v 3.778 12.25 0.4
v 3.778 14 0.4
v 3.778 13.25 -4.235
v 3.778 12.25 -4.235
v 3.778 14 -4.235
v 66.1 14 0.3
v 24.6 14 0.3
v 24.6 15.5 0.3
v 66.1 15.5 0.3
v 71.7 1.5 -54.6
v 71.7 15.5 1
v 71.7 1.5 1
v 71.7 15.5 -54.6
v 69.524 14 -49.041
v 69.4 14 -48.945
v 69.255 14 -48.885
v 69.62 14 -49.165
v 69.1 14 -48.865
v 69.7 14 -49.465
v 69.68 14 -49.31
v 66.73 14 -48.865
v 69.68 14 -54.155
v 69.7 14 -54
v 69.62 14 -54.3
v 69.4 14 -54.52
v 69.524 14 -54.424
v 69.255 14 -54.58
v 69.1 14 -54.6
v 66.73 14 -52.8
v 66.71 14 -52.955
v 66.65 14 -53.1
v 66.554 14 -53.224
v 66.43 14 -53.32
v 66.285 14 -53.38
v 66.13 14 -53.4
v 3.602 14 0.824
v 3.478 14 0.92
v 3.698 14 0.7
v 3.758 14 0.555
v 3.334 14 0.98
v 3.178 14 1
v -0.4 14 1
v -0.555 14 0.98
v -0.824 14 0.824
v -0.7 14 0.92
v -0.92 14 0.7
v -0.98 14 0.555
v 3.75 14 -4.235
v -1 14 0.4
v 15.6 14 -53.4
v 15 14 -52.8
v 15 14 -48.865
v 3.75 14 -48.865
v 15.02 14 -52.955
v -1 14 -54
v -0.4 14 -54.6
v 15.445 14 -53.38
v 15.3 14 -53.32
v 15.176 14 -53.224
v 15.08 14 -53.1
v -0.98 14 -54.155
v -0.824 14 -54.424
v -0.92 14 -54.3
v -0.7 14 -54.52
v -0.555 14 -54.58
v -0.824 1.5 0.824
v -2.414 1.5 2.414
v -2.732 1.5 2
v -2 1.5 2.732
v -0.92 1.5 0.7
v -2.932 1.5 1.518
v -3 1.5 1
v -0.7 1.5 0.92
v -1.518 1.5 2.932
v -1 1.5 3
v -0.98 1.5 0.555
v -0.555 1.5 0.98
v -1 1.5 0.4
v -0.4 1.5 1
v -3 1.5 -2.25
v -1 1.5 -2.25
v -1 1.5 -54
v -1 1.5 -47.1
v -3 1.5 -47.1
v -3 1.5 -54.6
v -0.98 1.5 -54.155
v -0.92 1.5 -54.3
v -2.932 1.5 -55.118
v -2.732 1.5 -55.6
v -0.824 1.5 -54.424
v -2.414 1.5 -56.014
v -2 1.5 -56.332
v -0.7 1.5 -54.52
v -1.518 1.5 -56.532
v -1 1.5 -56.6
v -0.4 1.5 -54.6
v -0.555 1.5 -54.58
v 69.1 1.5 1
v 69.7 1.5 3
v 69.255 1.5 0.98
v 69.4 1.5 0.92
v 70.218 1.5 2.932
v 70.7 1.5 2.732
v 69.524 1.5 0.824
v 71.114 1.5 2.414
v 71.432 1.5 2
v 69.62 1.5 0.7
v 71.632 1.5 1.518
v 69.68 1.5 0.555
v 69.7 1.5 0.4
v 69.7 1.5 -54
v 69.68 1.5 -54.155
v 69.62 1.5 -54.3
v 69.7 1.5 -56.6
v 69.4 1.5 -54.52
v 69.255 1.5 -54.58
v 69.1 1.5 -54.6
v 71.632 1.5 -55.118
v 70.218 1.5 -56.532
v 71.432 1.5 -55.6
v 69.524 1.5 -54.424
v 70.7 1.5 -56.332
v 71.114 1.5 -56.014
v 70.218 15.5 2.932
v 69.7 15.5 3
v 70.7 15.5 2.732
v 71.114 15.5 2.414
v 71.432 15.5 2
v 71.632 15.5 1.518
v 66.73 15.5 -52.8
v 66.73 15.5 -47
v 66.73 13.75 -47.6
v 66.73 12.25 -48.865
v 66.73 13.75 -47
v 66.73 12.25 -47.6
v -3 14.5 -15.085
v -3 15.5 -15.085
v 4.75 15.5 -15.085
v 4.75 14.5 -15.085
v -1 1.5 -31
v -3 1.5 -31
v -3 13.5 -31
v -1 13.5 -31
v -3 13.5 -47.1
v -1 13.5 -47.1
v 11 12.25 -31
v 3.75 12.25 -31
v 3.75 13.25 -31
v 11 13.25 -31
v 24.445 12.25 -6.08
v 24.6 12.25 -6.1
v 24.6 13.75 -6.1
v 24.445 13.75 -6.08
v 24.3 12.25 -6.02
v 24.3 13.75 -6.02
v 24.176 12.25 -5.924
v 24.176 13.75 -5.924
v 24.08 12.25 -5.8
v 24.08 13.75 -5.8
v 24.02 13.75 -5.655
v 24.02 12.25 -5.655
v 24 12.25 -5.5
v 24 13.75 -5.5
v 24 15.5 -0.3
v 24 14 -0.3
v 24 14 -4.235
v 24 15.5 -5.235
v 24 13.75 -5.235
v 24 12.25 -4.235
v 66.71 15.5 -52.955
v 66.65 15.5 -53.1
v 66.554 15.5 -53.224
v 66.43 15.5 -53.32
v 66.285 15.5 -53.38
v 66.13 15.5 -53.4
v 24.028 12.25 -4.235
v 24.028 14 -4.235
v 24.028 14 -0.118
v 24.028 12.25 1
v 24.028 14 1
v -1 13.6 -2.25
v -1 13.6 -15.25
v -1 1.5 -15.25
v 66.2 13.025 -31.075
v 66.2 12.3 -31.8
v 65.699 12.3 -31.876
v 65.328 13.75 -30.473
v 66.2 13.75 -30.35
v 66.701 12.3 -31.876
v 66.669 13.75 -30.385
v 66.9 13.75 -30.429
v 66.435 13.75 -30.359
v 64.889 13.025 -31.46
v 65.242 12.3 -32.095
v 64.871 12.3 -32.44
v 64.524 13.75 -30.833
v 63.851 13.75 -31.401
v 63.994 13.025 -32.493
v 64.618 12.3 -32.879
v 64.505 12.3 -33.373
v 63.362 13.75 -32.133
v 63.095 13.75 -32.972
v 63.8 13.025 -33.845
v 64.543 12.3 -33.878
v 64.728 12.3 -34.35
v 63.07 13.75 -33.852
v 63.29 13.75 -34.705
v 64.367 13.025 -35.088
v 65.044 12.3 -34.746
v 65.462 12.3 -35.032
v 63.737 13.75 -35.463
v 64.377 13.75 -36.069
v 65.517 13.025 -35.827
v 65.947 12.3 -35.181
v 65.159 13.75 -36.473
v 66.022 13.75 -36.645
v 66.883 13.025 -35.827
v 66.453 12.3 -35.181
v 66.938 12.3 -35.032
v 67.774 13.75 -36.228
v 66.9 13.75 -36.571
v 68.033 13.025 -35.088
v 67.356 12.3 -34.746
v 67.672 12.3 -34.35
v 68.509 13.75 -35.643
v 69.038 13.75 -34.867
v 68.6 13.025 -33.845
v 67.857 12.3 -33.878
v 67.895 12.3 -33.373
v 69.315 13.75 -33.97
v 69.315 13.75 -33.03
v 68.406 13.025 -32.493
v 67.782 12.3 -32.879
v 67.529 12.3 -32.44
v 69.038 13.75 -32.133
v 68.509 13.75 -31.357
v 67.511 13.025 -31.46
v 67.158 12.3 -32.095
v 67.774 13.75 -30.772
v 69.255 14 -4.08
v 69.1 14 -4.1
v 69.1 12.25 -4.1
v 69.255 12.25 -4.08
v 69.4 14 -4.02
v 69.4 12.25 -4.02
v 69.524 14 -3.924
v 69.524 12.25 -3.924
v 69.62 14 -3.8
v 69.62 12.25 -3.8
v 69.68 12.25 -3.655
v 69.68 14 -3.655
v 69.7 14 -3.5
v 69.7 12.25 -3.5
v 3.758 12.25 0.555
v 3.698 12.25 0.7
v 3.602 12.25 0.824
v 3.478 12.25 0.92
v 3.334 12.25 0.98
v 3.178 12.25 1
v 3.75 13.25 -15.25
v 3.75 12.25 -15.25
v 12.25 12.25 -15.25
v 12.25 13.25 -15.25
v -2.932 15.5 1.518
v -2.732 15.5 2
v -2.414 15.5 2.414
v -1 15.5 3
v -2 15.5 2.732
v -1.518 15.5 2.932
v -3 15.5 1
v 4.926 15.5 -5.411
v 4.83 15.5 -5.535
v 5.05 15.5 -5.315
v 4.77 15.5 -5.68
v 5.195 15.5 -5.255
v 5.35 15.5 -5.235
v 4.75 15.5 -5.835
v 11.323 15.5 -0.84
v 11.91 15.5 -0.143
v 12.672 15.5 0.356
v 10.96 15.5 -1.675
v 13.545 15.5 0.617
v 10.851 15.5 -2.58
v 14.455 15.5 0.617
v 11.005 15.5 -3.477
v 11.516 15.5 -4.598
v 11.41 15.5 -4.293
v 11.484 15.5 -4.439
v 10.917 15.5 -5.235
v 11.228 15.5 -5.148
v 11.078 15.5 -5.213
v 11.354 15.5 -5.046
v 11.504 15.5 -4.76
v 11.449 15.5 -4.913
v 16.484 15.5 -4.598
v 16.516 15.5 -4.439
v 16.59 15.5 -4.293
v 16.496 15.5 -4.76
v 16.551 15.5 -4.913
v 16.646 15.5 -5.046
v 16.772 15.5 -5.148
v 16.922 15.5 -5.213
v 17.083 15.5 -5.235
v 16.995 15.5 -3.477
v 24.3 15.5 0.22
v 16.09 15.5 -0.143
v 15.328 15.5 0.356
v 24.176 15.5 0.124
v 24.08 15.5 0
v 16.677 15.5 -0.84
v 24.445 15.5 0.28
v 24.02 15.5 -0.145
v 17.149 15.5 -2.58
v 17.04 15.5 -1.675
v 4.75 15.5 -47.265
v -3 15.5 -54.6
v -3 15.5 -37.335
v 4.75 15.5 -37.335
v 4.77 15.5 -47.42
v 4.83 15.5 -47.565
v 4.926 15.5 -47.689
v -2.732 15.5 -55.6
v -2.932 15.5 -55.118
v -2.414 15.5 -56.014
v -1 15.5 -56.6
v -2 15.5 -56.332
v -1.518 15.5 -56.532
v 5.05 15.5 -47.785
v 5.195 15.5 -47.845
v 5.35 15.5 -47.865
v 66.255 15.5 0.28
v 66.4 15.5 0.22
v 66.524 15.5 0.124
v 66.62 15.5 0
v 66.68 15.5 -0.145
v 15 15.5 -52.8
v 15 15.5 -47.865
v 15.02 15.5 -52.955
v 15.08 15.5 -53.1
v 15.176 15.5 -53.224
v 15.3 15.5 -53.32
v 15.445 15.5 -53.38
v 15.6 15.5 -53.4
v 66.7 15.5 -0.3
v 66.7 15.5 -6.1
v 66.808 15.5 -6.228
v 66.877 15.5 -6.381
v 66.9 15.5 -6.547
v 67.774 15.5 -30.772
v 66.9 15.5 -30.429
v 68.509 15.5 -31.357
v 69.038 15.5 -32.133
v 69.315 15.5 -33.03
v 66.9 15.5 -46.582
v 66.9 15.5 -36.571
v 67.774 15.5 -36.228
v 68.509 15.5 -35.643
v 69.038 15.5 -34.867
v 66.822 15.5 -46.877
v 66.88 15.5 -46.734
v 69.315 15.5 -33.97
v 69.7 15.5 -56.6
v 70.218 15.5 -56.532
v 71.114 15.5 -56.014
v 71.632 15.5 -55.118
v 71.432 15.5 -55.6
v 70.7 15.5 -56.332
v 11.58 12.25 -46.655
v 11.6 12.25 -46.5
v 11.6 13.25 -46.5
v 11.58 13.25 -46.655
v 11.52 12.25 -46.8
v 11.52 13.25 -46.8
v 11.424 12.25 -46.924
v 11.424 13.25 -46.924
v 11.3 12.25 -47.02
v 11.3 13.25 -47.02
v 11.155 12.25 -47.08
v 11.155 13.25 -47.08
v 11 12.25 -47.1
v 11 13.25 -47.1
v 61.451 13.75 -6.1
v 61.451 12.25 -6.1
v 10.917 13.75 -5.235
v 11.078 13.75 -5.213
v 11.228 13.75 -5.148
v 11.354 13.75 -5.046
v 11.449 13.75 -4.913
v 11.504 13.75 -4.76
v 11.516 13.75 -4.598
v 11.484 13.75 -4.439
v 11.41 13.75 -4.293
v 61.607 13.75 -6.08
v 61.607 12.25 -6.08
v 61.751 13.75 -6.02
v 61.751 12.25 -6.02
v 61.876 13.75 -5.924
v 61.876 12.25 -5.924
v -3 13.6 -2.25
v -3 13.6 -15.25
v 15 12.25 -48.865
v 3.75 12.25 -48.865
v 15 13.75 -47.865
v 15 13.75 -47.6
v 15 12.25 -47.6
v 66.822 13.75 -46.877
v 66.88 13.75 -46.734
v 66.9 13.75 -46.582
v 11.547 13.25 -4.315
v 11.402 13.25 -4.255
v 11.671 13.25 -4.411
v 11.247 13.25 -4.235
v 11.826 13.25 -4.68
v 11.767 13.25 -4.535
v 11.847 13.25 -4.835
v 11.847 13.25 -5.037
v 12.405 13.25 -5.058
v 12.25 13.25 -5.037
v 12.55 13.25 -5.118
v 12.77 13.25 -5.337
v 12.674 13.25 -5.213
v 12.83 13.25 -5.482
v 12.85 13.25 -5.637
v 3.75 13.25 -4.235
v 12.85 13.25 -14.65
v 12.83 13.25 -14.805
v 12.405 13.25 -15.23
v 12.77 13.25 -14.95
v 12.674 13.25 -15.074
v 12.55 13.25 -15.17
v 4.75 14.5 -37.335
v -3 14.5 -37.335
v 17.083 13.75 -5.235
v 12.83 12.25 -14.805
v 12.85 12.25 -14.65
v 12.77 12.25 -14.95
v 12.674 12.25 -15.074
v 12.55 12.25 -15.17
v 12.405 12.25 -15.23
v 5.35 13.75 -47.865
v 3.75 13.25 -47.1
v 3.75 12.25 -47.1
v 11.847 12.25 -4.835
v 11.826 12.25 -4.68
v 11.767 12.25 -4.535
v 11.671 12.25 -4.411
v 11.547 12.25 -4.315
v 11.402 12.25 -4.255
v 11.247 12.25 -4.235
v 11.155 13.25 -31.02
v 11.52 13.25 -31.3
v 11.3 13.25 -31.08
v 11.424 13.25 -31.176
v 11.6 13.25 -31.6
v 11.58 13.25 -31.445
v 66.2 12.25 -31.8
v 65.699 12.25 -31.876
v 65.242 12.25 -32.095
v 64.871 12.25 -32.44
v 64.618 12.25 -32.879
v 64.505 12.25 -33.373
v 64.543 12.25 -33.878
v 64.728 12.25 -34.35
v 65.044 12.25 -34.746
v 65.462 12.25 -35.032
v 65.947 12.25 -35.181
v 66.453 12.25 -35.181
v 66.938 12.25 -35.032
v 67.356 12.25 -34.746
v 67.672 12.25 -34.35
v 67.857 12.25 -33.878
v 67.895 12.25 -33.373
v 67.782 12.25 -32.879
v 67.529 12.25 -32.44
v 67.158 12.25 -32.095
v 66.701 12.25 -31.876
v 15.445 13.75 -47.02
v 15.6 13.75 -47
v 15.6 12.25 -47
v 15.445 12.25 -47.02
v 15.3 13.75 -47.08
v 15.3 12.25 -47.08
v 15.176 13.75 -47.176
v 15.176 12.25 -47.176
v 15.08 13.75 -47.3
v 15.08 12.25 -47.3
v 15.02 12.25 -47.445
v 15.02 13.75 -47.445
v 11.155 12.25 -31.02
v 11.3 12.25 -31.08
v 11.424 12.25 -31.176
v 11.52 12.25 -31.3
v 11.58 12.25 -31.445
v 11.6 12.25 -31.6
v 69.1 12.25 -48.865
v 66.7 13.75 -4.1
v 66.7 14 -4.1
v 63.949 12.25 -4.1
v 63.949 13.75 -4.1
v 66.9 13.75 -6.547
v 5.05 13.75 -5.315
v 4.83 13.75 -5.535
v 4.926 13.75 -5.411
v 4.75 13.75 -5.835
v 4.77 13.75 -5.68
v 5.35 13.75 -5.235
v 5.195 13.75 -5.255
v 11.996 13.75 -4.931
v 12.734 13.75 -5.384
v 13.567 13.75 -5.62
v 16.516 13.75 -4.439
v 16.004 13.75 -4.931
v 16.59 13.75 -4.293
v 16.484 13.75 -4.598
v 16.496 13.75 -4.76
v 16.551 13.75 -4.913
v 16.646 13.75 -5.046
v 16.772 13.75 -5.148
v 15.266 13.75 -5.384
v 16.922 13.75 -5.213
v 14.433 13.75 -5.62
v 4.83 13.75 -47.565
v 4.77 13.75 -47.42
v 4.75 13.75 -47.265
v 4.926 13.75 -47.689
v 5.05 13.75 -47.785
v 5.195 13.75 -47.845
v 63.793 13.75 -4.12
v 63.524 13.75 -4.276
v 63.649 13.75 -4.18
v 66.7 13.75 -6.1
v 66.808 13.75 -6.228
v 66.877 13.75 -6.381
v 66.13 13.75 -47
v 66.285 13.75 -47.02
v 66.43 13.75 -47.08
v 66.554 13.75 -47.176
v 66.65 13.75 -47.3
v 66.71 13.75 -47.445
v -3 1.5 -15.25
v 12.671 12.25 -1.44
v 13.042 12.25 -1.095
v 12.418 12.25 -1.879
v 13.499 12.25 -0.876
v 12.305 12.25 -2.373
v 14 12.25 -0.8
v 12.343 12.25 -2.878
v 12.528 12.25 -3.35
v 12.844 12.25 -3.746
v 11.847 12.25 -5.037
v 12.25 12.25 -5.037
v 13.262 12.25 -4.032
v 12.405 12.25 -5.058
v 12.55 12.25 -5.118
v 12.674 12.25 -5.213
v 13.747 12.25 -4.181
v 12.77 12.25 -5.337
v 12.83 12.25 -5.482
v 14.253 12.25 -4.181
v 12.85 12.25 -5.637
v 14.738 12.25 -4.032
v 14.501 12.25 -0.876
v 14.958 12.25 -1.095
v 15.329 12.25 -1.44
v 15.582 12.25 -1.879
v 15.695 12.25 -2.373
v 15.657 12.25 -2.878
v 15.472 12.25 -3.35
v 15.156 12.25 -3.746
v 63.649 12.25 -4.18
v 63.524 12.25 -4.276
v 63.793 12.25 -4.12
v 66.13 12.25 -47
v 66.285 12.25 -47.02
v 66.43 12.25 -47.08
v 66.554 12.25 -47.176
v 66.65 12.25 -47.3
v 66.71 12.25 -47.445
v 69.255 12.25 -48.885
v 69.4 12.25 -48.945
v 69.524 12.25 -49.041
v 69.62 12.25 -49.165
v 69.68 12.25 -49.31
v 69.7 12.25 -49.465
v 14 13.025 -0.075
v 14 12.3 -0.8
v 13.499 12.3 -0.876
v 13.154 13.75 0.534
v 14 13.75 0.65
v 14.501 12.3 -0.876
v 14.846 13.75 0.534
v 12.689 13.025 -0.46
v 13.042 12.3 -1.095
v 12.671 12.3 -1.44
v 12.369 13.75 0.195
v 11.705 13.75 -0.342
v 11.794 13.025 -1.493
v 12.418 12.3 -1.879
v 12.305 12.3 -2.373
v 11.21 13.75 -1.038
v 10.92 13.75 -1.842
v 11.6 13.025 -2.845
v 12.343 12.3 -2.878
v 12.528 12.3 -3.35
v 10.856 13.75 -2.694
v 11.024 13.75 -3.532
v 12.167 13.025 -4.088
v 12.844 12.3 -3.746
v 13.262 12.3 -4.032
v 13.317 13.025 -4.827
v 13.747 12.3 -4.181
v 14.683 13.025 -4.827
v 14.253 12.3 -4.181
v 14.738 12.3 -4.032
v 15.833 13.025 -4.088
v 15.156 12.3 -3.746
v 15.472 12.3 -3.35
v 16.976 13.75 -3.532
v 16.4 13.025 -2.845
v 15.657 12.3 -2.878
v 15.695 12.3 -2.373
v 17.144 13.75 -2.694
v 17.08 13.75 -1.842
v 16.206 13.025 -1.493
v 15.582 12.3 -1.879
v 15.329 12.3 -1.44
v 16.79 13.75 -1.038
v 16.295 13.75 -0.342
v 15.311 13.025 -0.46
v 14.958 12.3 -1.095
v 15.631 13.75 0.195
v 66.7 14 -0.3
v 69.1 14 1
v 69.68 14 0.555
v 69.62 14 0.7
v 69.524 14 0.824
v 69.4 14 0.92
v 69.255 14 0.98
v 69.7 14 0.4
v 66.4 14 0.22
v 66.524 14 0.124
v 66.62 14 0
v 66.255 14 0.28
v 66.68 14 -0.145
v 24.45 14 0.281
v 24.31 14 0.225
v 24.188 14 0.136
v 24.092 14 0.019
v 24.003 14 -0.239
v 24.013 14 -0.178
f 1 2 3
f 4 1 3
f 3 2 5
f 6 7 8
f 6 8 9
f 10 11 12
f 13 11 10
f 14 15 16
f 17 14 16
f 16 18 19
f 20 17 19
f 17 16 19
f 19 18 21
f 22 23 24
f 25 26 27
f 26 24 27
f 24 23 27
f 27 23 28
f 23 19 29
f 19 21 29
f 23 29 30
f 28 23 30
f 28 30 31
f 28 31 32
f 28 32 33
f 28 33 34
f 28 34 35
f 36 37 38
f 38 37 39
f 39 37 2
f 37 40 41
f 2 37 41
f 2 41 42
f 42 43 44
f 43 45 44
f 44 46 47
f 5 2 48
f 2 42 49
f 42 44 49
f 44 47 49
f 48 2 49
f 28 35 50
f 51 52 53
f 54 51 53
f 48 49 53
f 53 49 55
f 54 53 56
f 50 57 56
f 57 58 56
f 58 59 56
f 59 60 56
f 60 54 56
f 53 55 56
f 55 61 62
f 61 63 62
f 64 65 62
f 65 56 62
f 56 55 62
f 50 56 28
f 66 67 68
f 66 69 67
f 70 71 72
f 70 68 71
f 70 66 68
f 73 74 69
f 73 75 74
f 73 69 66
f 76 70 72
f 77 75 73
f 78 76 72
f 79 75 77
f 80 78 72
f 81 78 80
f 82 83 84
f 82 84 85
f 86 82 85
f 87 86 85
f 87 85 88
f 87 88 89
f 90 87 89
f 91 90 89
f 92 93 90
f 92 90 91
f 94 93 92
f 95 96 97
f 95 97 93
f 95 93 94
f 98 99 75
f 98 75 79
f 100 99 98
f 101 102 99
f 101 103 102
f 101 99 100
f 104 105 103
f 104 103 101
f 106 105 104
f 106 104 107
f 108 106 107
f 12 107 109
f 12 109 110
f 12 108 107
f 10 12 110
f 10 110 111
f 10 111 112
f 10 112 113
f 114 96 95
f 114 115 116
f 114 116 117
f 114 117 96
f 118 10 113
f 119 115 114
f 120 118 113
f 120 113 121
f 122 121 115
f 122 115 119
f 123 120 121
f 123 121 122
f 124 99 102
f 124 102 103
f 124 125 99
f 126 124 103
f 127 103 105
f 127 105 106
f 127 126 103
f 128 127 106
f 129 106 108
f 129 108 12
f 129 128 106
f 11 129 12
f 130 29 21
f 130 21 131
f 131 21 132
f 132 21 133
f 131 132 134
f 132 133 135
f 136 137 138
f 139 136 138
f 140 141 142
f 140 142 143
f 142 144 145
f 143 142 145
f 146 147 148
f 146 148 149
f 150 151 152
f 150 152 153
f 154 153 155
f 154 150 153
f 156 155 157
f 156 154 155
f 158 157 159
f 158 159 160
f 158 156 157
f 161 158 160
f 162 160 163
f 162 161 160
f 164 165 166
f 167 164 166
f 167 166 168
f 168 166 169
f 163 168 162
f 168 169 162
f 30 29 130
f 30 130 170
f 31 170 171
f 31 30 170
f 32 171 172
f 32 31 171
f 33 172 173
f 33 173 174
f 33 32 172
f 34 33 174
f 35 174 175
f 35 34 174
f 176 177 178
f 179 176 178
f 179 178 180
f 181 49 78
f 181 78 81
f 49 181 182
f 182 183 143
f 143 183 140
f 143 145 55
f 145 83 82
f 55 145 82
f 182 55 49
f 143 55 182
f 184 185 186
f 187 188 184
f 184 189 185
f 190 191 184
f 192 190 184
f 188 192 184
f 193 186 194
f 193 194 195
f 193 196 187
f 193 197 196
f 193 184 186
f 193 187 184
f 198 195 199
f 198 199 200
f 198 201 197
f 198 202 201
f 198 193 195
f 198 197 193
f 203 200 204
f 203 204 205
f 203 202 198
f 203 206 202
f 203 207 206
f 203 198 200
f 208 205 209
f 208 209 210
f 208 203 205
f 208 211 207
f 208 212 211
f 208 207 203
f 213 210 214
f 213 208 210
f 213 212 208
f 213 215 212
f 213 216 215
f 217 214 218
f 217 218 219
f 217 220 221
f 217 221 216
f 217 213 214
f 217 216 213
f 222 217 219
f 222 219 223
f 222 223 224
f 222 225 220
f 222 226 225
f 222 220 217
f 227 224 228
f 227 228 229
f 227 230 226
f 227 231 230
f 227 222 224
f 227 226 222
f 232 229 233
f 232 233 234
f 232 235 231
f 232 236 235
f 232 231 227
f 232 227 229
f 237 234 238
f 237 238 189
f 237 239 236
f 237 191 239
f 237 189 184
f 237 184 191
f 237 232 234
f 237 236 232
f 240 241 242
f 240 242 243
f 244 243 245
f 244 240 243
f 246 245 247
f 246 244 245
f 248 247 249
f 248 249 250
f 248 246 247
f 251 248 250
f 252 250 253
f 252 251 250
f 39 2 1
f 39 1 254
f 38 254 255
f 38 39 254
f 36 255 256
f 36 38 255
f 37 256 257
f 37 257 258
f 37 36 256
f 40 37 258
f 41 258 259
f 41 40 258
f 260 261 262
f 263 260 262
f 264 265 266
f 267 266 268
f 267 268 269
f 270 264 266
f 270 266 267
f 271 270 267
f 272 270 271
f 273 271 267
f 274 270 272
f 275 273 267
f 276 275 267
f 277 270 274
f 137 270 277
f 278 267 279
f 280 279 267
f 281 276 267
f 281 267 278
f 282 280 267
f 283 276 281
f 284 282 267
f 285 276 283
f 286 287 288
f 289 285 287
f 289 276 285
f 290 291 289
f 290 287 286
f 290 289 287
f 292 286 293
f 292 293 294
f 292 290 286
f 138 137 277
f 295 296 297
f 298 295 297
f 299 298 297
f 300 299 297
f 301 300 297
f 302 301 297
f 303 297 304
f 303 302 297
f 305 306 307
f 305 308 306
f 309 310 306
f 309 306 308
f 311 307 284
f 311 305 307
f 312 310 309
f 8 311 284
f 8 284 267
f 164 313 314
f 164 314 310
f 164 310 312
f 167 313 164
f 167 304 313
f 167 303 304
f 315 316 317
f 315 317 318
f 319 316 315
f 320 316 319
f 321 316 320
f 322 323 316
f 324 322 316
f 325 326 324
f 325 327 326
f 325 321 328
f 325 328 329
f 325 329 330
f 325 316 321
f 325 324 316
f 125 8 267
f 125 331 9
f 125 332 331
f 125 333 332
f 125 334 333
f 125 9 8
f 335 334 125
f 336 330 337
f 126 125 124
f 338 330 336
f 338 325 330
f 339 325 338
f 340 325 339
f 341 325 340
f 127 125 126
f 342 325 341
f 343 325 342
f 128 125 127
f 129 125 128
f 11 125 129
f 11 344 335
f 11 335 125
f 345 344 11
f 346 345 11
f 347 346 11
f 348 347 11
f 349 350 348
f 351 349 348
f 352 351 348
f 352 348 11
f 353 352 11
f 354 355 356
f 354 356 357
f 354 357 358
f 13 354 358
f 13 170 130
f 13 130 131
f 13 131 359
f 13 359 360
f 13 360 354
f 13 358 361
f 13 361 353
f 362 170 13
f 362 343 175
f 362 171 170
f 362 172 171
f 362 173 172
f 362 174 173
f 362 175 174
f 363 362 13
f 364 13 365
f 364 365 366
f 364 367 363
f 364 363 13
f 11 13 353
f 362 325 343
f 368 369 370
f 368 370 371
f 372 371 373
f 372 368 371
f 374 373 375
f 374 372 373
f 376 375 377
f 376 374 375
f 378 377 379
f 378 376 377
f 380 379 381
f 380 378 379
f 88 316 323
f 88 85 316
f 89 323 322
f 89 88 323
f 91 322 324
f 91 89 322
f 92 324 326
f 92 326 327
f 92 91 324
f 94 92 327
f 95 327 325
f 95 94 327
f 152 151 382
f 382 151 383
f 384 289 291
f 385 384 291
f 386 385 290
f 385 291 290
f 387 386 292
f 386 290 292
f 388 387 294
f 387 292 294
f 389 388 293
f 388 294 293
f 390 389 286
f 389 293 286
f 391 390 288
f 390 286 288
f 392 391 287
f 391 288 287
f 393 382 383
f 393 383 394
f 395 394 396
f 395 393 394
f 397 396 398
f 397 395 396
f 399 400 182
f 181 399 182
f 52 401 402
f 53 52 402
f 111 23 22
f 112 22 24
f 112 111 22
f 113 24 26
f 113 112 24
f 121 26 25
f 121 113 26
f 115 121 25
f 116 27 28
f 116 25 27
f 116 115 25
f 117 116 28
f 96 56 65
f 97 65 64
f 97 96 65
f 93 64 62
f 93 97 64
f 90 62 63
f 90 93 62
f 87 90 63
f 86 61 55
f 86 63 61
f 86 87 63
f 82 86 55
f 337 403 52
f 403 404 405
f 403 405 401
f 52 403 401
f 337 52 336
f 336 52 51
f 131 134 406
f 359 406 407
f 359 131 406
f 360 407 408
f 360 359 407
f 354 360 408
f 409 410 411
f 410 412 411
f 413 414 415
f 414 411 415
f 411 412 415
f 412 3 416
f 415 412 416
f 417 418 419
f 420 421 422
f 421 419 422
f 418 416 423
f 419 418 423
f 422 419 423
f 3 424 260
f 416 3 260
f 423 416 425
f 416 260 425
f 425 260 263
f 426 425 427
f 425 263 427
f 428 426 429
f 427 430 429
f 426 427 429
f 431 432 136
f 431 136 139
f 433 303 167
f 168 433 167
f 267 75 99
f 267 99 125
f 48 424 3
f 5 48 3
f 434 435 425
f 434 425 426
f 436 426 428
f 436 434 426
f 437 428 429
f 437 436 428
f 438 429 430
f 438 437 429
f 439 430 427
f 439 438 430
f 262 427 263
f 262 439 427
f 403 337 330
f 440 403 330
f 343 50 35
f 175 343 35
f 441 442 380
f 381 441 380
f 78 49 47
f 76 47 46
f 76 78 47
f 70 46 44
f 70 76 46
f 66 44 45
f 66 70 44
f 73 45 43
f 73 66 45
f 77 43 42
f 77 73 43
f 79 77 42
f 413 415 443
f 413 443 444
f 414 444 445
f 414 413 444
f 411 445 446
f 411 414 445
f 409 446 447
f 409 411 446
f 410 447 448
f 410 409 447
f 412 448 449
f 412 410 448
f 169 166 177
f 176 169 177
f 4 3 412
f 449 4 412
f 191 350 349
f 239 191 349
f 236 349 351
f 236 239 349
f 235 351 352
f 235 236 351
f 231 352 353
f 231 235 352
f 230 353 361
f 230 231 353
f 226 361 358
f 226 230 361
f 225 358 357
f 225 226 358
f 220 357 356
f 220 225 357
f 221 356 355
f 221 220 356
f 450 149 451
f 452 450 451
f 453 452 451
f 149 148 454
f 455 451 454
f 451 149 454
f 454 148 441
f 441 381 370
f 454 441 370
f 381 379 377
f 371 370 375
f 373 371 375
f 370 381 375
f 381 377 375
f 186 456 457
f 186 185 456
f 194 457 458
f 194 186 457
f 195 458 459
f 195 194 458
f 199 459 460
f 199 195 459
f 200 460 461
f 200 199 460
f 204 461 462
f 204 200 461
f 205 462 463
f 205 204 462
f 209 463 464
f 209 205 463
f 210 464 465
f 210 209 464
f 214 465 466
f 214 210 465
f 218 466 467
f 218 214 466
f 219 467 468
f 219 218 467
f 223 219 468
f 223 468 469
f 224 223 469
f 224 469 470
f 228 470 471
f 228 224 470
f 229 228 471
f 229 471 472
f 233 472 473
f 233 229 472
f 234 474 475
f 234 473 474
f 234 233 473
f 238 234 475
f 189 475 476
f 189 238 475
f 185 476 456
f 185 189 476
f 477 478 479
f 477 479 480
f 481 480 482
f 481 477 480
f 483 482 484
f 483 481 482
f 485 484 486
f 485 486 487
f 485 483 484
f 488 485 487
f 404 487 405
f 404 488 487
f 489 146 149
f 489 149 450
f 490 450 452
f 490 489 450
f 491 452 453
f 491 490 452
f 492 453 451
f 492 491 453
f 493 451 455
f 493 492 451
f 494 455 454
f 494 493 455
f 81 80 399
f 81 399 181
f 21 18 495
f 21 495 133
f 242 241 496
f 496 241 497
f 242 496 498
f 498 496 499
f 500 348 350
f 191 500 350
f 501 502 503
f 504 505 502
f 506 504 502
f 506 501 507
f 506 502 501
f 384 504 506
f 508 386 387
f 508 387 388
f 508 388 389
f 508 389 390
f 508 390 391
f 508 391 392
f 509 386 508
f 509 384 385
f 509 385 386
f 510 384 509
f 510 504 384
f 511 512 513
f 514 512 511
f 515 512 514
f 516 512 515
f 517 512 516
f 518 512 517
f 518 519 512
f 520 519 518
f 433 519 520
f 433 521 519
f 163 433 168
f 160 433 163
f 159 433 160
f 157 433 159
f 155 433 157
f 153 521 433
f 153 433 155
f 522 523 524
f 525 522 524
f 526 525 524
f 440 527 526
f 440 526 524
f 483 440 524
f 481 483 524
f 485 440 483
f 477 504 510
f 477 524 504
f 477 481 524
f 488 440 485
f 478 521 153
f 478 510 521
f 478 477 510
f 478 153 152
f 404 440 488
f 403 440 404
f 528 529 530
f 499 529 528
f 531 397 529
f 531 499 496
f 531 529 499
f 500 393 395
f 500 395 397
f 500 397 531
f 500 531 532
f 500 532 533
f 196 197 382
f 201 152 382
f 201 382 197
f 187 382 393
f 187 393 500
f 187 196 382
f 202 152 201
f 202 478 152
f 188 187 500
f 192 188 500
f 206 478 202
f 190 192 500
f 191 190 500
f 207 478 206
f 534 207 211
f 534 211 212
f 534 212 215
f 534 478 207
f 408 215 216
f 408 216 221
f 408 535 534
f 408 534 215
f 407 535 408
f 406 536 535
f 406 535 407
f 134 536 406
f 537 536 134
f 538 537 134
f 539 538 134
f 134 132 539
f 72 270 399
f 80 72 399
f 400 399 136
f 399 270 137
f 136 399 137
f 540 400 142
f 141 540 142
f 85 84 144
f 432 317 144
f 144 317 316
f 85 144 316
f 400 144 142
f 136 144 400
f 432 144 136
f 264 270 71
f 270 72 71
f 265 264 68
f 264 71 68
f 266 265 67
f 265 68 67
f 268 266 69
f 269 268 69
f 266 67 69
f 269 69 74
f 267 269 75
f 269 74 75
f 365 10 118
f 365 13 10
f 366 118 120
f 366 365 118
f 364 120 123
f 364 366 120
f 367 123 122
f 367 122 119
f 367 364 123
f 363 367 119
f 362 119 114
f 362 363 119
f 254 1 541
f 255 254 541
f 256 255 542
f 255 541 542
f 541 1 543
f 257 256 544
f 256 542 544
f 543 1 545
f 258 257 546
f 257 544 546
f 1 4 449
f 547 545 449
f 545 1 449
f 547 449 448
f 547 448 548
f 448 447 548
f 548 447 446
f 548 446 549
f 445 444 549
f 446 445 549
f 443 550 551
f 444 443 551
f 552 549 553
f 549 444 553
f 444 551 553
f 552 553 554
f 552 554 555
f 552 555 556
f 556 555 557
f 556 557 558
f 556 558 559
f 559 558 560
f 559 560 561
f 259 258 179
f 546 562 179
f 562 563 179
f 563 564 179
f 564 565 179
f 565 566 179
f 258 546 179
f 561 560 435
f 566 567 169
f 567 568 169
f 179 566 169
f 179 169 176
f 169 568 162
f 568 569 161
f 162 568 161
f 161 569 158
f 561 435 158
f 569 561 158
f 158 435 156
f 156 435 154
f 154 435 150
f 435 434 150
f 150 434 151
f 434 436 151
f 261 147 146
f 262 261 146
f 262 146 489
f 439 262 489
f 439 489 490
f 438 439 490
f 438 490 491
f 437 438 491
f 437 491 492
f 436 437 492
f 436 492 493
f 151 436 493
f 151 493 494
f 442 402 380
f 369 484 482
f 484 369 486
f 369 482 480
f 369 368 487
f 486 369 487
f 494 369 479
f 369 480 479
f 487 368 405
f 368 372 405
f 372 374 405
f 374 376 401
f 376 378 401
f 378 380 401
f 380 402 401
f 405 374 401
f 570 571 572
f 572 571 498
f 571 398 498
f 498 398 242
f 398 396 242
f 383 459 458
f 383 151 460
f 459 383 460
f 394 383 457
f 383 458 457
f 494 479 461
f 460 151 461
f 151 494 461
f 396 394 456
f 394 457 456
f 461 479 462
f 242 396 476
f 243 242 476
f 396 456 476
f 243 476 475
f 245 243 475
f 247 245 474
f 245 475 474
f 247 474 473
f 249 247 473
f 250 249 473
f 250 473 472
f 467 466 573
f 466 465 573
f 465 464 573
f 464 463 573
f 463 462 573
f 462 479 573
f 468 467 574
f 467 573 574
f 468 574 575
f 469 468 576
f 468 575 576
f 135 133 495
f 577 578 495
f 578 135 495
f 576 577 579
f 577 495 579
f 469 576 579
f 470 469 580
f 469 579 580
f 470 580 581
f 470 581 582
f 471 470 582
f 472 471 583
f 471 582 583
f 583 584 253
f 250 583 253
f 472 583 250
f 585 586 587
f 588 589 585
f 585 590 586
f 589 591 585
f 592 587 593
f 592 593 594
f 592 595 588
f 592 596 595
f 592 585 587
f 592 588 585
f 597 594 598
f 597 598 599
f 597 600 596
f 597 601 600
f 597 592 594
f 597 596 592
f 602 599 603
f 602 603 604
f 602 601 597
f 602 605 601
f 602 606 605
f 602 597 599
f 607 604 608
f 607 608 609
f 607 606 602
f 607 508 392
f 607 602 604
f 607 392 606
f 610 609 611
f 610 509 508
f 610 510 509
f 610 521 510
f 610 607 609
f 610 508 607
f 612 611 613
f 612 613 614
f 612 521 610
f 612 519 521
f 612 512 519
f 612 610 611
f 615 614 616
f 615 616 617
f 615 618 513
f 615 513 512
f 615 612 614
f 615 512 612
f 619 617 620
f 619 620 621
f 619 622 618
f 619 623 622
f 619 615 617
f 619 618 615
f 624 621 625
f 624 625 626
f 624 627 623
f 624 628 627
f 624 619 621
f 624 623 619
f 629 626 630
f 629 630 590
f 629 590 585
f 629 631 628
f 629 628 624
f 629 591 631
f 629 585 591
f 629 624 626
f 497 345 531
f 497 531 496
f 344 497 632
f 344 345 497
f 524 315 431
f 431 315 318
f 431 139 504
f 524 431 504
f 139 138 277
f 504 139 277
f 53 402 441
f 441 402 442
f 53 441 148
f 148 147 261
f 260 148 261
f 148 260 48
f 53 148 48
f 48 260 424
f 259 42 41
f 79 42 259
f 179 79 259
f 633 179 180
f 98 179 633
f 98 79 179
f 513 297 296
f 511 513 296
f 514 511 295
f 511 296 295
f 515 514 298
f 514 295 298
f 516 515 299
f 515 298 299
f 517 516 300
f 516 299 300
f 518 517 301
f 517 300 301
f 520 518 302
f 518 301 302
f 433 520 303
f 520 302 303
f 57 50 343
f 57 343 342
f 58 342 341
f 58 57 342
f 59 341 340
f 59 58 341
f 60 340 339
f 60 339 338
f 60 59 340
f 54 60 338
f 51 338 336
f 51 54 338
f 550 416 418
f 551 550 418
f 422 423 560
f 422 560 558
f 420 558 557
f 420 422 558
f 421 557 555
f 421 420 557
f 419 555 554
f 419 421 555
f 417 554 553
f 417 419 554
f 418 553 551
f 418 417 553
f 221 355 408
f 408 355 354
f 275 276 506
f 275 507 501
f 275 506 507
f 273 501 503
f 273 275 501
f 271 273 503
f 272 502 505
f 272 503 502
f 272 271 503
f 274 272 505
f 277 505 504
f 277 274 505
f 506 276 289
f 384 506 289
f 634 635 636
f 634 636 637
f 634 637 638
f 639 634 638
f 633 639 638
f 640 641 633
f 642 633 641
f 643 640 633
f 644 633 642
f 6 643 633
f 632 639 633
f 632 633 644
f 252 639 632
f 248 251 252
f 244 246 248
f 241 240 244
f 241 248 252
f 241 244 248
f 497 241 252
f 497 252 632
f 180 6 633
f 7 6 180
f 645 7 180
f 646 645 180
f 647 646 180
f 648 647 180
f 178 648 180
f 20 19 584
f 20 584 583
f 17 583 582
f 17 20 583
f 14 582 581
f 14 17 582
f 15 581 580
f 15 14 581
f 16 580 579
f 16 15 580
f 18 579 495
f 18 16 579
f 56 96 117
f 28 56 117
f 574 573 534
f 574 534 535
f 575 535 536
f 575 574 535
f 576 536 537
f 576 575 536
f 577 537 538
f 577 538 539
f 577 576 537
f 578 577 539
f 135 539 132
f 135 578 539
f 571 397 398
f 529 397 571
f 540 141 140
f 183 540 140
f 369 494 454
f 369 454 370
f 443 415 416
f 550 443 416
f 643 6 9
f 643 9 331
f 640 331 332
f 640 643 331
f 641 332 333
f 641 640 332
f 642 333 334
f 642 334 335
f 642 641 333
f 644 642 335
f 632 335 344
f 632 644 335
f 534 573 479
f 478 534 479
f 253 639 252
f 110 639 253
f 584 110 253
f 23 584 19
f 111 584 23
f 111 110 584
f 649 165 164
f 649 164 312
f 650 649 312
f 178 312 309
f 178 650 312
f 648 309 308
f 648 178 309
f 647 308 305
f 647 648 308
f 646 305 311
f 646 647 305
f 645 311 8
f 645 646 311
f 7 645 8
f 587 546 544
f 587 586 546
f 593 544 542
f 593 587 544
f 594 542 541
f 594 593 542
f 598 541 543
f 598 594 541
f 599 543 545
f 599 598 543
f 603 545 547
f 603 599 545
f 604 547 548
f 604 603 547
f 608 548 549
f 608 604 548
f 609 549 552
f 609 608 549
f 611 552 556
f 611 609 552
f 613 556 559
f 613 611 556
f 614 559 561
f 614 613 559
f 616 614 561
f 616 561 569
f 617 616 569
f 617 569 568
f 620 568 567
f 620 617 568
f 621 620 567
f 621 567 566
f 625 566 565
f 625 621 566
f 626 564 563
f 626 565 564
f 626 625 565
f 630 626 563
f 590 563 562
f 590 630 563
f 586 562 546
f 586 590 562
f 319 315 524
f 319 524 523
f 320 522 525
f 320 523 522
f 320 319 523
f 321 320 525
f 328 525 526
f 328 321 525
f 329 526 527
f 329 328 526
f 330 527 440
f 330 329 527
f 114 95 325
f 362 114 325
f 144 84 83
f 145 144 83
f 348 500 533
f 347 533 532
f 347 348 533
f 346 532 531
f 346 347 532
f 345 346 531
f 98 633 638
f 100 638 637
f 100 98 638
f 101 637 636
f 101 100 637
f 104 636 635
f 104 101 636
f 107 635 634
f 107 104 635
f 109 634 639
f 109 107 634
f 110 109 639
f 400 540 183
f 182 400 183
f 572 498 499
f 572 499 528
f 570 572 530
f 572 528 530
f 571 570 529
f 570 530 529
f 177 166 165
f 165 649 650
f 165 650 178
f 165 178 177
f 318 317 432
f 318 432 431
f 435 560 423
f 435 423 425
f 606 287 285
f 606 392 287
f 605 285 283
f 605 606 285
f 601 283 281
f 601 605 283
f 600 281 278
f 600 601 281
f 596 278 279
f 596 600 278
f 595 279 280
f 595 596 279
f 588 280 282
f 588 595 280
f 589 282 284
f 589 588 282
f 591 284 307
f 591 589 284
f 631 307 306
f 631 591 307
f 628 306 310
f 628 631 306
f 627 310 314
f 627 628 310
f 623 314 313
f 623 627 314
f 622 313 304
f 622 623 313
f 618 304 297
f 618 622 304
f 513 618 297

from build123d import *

# Parameters (mm, degrees)
WALLS_START                                    = 1.5
SKETCH2_W                                      = 74.7
SKETCH2_H                                      = 59.6
SKETCH2_W_2                                    = 70.7
SKETCH2_H_2                                    = 55.6
WALLS_DEPTH                                    = 12.5
BOSS_EXTRUDE2_START                            = -3
SKETCH3_W                                      = 59.6
SKETCH3_H                                      = 1.5
BOSS_EXTRUDE2_DEPTH                            = 74.7
SKETCH4_W                                      = 20.4
SKETCH4_H                                      = 16.1
CUT_EXTRUDE1_DEPTH                             = 12
SKETCH5_W                                      = 18.25
SKETCH5_H                                      = 13
CUT_EXTRUDE2_DEPTH                             = 12.1
SKETCH6_W                                      = 51.73
SKETCH6_H                                      = 6.4
SKETCH6_W_2                                    = 42.7
CUT_EXTRUDE3_DEPTH                             = 93.414555131
BOSS_EXTRUDE5_START                            = 2
BOSS_EXTRUDE5_DEPTH                            = 3.25
CUT_EXTRUDE6_DEPTH                             = 1.75
SKETCH16_W                                     = 12.95
SKETCH16_H                                     = 22.25
CUT_EXTRUDE7_DEPTH                             = 1
HOLE_PADDING_DEPTH                             = 1.5
ROOF_FILL_IN_DEPTH                             = 1.75
FILLET2_R                                      = 2
CUT_EXTRUDE9_START                             = 2
SKETCH18_W                                     = 20.4
SKETCH18_H                                     = 16.1
SKETCH18_W_2                                   = 18.25
SKETCH18_H_2                                   = 13
CUT_EXTRUDE9_DEPTH                             = 1
ROOF_FILL_IN_2_REACH                           = 94.199
CSK_FOR_M3_FLAT_HEAD_MACHINE_SCREW8_AT_2_COUNT = 2
CSK_FOR_M3_FLAT_HEAD_MACHINE_SCREW8_AT_2_PITCH = 60.711119245
HOLE_CLEARANCE_REACH                           = 94.166
SKETCH46_R                                     = 3.15
FILLET3_R                                      = 0.6


with BuildPart() as part:
    # Sketch2 → walls (new body)
    with BuildSketch(Plane(origin=(0, 0, 0), x_dir=(1, 0, 0), z_dir=(0, 1, 0)).offset(WALLS_START)):
        with Locations((34.35, 26.8)):
            Rectangle(SKETCH2_W, SKETCH2_H)
        with Locations((34.35, 26.8)):
            Rectangle(SKETCH2_W_2, SKETCH2_H_2, mode=Mode.SUBTRACT)
    extrude(amount=WALLS_DEPTH)

    # Sketch3 → Boss-Extrude2 (add)
    with BuildSketch(Plane(origin=(0, 0, 0), x_dir=(0, 0, -1), z_dir=(1, 0, 0)).offset(BOSS_EXTRUDE2_START)):
        with Locations((26.8, 14.75)):
            Rectangle(SKETCH3_W, SKETCH3_H)
    extrude(amount=BOSS_EXTRUDE2_DEPTH)

    # Sketch4 → Cut-Extrude1 (cut)
    with BuildSketch(Plane(origin=(0, 1.5, 0), x_dir=(1, 0, 0), z_dir=(0, 1, 0))):
        with Locations((1.4, 39.05)):
            Rectangle(SKETCH4_W, SKETCH4_H)
    extrude(amount=CUT_EXTRUDE1_DEPTH, mode=Mode.SUBTRACT)

    # Sketch5 → Cut-Extrude2 (cut)
    with BuildSketch(Plane(origin=(0, 1.5, 0), x_dir=(1, 0, 0), z_dir=(0, 1, 0))):
        with Locations((3.725, 8.75)):
            Rectangle(SKETCH5_W, SKETCH5_H)
    extrude(amount=CUT_EXTRUDE2_DEPTH, mode=Mode.SUBTRACT)

    # Sketch6 → Cut-Extrude3 (cut, through all)
    with BuildSketch(Plane(origin=(0, 1.5, 0), x_dir=(1, 0, 0), z_dir=(0, 1, 0))):
        with Locations((40.865, 50.2)):
            Rectangle(SKETCH6_W, SKETCH6_H)
        with Locations((45.35, 2.9)):
            Rectangle(SKETCH6_W_2, SKETCH6_H)
    extrude(amount=CUT_EXTRUDE3_DEPTH, mode=Mode.SUBTRACT)

    # Sketch13 → Boss-Extrude5 (add)
    with BuildSketch(Plane(origin=(0, 10.25, 0), x_dir=(1, 0, 0), z_dir=(0, 1, 0)).offset(BOSS_EXTRUDE5_START)):
        Polygon((3.75, 4.235), (24, 4.235), (24, 6.1), (66.7, 6.1), (66.7, 4.235), (67.9, 4.235), (67.9, 48.865), (66.73, 48.865), (66.73, 47), (15, 47), (15, 48.865), (3.75, 48.865), align=None)
    extrude(amount=BOSS_EXTRUDE5_DEPTH)

    # Sketch15 → Cut-Extrude6 (cut)
    with BuildSketch(Plane(origin=(0, 15.5, 0), x_dir=(1, 0, 0), z_dir=(0, 1, 0))):
        Polygon((4.75, 5.235), (24, 5.235), (24, 6.1), (66.9, 6.1), (66.9, 47), (15, 47), (15, 47.865), (4.75, 47.865), align=None)
    extrude(amount=-CUT_EXTRUDE6_DEPTH, mode=Mode.SUBTRACT)

    # Sketch16 → Cut-Extrude7 (cut)
    with BuildSketch(Plane(origin=(0, 15.5, 0), x_dir=(1, 0, 0), z_dir=(0, 1, 0))):
        with Locations((3.475, 26.21)):
            Rectangle(SKETCH16_W, SKETCH16_H)
    extrude(amount=-CUT_EXTRUDE7_DEPTH, mode=Mode.SUBTRACT)

    # Sketch45 → Hole padding (add)
    with BuildSketch(Plane(origin=(0, 13.75, 0), x_dir=(1, 0, 0), z_dir=(0, 1, 0))):
        Polygon((63.7, 4.1), (66.7, 4.1), (66.7, 6.1), (61.7, 6.1), align=None)
    extrude(amount=-HOLE_PADDING_DEPTH)

    # Sketch43 → Roof fill-in (add)
    with BuildSketch(Plane.XZ.offset(-14)):
        Polygon((67.9, -48.865), (67.9, -4.235), (66.7, -4.235), (66.7, -4.1), (67.9, -4.1), (69.7, -4.1), (69.7, -48.865), align=None)
    extrude(amount=ROOF_FILL_IN_DEPTH)

    # Fillet2
    fillet2_edges = [part.edges().sort_by_distance(p)[0] for p in [
        (71.7, 8.5, -56.6),
        (71.7, 8.5, 3),
        (-3, 8.5, 3),
        (-3, 8.5, -56.6),
    ]]
    fillet(fillet2_edges, radius=FILLET2_R)

    # Sketch18 → Cut-Extrude9 (cut)
    with BuildSketch(Plane(origin=(0, 10.25, 0), x_dir=(1, 0, 0), z_dir=(0, 1, 0)).offset(CUT_EXTRUDE9_START)):
        with Locations((1.4, 39.05)):
            Rectangle(SKETCH18_W, SKETCH18_H)
        with Locations((3.725, 8.75)):
            Rectangle(SKETCH18_W_2, SKETCH18_H_2)
    extrude(amount=CUT_EXTRUDE9_DEPTH, mode=Mode.SUBTRACT)

    # Roof fill in 2: up to this face of the body (flat: up to its plane)
    roof_fill_in_2_end = Plane(part.part.faces().sort_by_distance((38.949640059, 12.25, -26.379272671))[0])
    # Sketch47 → Roof fill in 2 (add, up to the picked face)
    with BuildSketch(Plane.XZ.offset(-14), mode=Mode.PRIVATE) as roof_fill_in_2_sk1:
        Polygon((3.778208992, -4.235), (11.846933601, -4.235), (11.846933601, -5.037467277), (12.85, -5.037467277), (12.85, -4.235), (24.028208992, -4.235), (24.028208992, 1), (3.778208992, 1), align=None)
    roof_fill_in_2_tool1 = split(extrude(roof_fill_in_2_sk1.sketch, amount=ROOF_FILL_IN_2_REACH, mode=Mode.PRIVATE), bisect_by=roof_fill_in_2_end, keep=Keep.BOTH, mode=Mode.PRIVATE)
    add(roof_fill_in_2_tool1.solids().sort_by(Axis((13.891493, 14, -1.640249), (0, -1, 0)))[0])

    # Sketch42 → CSK for M3 Flat Head Machine Screw8 (revolve, cut)
    with BuildSketch(Plane(origin=(66.2, 13.75, -33.5), x_dir=(0, 0, 1), z_dir=(1, 0, 0))):
        Polygon((0, 0), (0, 8.521463052), (1.7, 7.5), (1.7, 1.45), (3.15, 0), align=None)
    csk_for_m3_flat_head_machine_screw8 = revolve(axis=Axis((66.2, 20.1, -33.5), (0, -1, 0)), mode=Mode.SUBTRACT)

    # CSK for M3 Flat Head Machine Screw8 at 2: CSK for M3 Flat Head Machine Screw8 ×2
    with Locations(*[Vector(-0.8598095480534521, 0, 0.5106148657022418) * (i * CSK_FOR_M3_FLAT_HEAD_MACHINE_SCREW8_AT_2_PITCH) for i in range(1, CSK_FOR_M3_FLAT_HEAD_MACHINE_SCREW8_AT_2_COUNT)]):
        add(csk_for_m3_flat_head_machine_screw8, mode=Mode.SUBTRACT)

    # Sketch46 → Hole clearance (cut, up to next)
    with BuildSketch(Plane(origin=(0, 13.75, 0), x_dir=(1, 0, 0), z_dir=(0, 1, 0)), mode=Mode.PRIVATE) as hole_clearance_sk1:
        with Locations((66.2, 33.5)):
            Circle(SKETCH46_R)
    hole_clearance_tool1 = extrude(hole_clearance_sk1.sketch, amount=HOLE_CLEARANCE_REACH, mode=Mode.PRIVATE) & part.part
    # Sketch46 → Hole clearance (cut, up to next)
    with BuildSketch(Plane(origin=(0, 13.75, 0), x_dir=(1, 0, 0), z_dir=(0, 1, 0)), mode=Mode.PRIVATE) as hole_clearance_sk2:
        with Locations((14, 2.5)):
            Circle(SKETCH46_R)
    hole_clearance_tool2 = extrude(hole_clearance_sk2.sketch, amount=HOLE_CLEARANCE_REACH, mode=Mode.PRIVATE) & part.part
    add(hole_clearance_tool1.solids().sort_by_distance((66.2, 13.75, -33.5))[0], mode=Mode.SUBTRACT)
    add(hole_clearance_tool2.solids().sort_by_distance((14, 13.75, -2.5))[0], mode=Mode.SUBTRACT)

    # Fillet3
    # the kernel refuses this fillet: 0.6 mm, written as the material it adds along each edge
    with BuildSketch(Plane(origin=(69.7, 1.5, 1), x_dir=(-1, 0, 0), z_dir=(0, 1, 0)), Plane(origin=(-1, 1.5, 1), x_dir=(0, 0, -1), z_dir=(0, 1, 0))) as fillet3_piece_1:
        with BuildLine():
            CenterArc((FILLET3_R, -FILLET3_R), FILLET3_R, 90, 90)
            Line((0, -FILLET3_R), (0, 0))
            Line((0, 0), (FILLET3_R, 0))
        make_face()
    extrude(amount=14)
    with BuildSketch(Plane(origin=(-1, 1.5, -54.6), x_dir=(0, 0, 1), z_dir=(0, 1, 0)), Plane(origin=(69.7, 1.5, -54.6), x_dir=(-1, 0, 0), z_dir=(0, 1, 0))) as fillet3_piece_2:
        with BuildLine():
            CenterArc((FILLET3_R, FILLET3_R), FILLET3_R, 180, 90)
            Line((0, FILLET3_R), (0, 0))
            Line((0, 0), (FILLET3_R, 0))
        make_face()
    extrude(amount=14)
    with BuildSketch(Plane(origin=(12.85, 12.25, -15.25), x_dir=(0, 0, 1), z_dir=(0, 1, 0)), Plane(origin=(11.6, 12.25, -47.1), x_dir=(0, 0, 1), z_dir=(0, 1, 0)), Plane(origin=(11.6, 12.25, -31), x_dir=(-1, 0, 0), z_dir=(0, 1, 0))) as fillet3_piece_3:
        with BuildLine():
            CenterArc((FILLET3_R, -FILLET3_R), FILLET3_R, 90, 90)
            Line((0, -FILLET3_R), (0, 0))
            Line((0, 0), (FILLET3_R, 0))
        make_face()
    extrude(amount=1)
    with BuildSketch(Plane(origin=(66.9, 15.5, -6.1), x_dir=(0, 0, -1), z_dir=(0, -1, 0))) as fillet3_piece_4:
        with BuildLine():
            CenterArc((0.447213595, -0.6), FILLET3_R, 90, 48.189685102)
            Line((0, -0.2), (0, 0))
            Line((0, 0), (0.447213595, 0))
        make_face()
    extrude(amount=2.868033989)
    with BuildSketch(Plane(origin=(66.9, 15.5, -47), x_dir=(-1, 0, 0), z_dir=(0, -1, 0))) as fillet3_piece_5:
        with BuildLine():
            CenterArc((0.6, -0.418449519), FILLET3_R, 135.779955569, 44.220044431)
            Line((0, -0.418449519), (0, 0))
            Line((0, 0), (0.17, 0))
        make_face()
    extrude(amount=2.796123798)
    with BuildSketch(Plane(origin=(4.75, 15.5, -47.865), x_dir=(0, 0, 1), z_dir=(0, -1, 0)), Plane(origin=(69.7, 15.5, -48.865), x_dir=(0, 0, -1), z_dir=(0, -1, 0))) as fillet3_piece_6:
        with BuildLine():
            CenterArc((FILLET3_R, -FILLET3_R), FILLET3_R, 90, 90)
            Line((0, -FILLET3_R), (0, 0))
            Line((0, 0), (FILLET3_R, 0))
        make_face()
    extrude(amount=3.25)
    with BuildSketch(Plane(origin=(4.75, 15.5, -5.235), x_dir=(0, 0, -1), z_dir=(0, -1, 0))) as fillet3_piece_7_section:
        with BuildLine():
            CenterArc((FILLET3_R, FILLET3_R), FILLET3_R, 180, 90)
            Line((0, FILLET3_R), (0, 0))
            Line((0, 0), (FILLET3_R, 0))
        make_face()
    fillet3_piece_7 = extrude(amount=3.25, mode=Mode.PRIVATE)
    fillet3_piece_7 = split(fillet3_piece_7, bisect_by=Plane(origin=(4.75, 13.25, -5.235), z_dir=(0, 1, 0)), keep=Keep.TOP, mode=Mode.PRIVATE)
    add(fillet3_piece_7)
    with BuildSketch(Plane(origin=(24, 12.25, -6.1), x_dir=(0, 0, 1), z_dir=(0, 1, 0)), Plane(origin=(66.7, 14, 0.3), x_dir=(0, 0, -1), z_dir=(0, 1, 0)), Plane(origin=(24, 14, 0.3), x_dir=(1, 0, 0), z_dir=(0, 1, 0)), Plane(origin=(15, 14, -53.4), x_dir=(0, 0, 1), z_dir=(0, 1, 0)), Plane(origin=(66.73, 12.25, -47), x_dir=(0, 0, -1), z_dir=(0, 1, 0)), Plane(origin=(66.73, 14, -53.4), x_dir=(-1, 0, 0), z_dir=(0, 1, 0)), Plane(origin=(15, 13.75, -47), x_dir=(0, 0, -1), z_dir=(0, -1, 0))) as fillet3_piece_8:
        with BuildLine():
            CenterArc((FILLET3_R, FILLET3_R), FILLET3_R, 180, 90)
            Line((0, FILLET3_R), (0, 0))
            Line((0, 0), (FILLET3_R, 0))
        make_face()
    extrude(amount=1.5)
    with BuildSketch(Plane(origin=(11.846933601, 13.25, -4.235), x_dir=(-1, 0, 0), z_dir=(0, -1, 0)), Plane(origin=(12.85, 13.25, -5.037467277), x_dir=(-1, 0, 0), z_dir=(0, -1, 0))) as fillet3_piece_9:
        with BuildLine():
            CenterArc((FILLET3_R, FILLET3_R), FILLET3_R, 180, 90)
            Line((0, FILLET3_R), (0, 0))
            Line((0, 0), (FILLET3_R, 0))
        make_face()
    extrude(amount=1)
    with BuildSketch(Plane(origin=(61.7, 13.75, -6.1), x_dir=(-1, 0, 0), z_dir=(0, -1, 0))) as fillet3_piece_10:
        with BuildLine():
            CenterArc((FILLET3_R * 0.414213562373, -FILLET3_R), FILLET3_R, 90, 45)
            Line((-FILLET3_R * 0.292893218813, -FILLET3_R * 0.292893218813), (0, 0))
            Line((0, 0), (FILLET3_R * 0.414213562373, 0))
        make_face()
    extrude(amount=1.5)
    with BuildSketch(Plane(origin=(3.778208992, 15.5, 1), x_dir=(-1, 0, 0), z_dir=(0, -1, 0)), Plane(origin=(69.7, 15.5, -4.1), x_dir=(0, 0, 1), z_dir=(0, -1, 0))) as fillet3_piece_11:
        with BuildLine():
            CenterArc((FILLET3_R, FILLET3_R), FILLET3_R, 180, 90)
            Line((0, FILLET3_R), (0, 0))
            Line((0, 0), (FILLET3_R, 0))
        make_face()
    extrude(amount=3.25)
    # the kernel refuses this fillet: 0.6 mm, written as the material it takes off along each edge
    with BuildSketch(Plane(origin=(15.562777975, 19.300306112, -5.235), x_dir=(0.7370421688498962, 0, 0.6758467587678743), z_dir=(0, -1, 0))) as fillet3_2_piece_1:
        with BuildLine():
            CenterArc((1.525902399, -0.585144526), FILLET3_R, 102.776309415, 124.703750134)
            Line((1.120394344, -1.027369827), (0, 0))
            ThreePointArc((0, 0), (0.696607617, -0.077991239), (1.393215234, 0))
        make_face()
    extrude(amount=5.550306112, mode=Mode.SUBTRACT)
    with BuildSketch(Plane(origin=(12.437222025, 19.300306112, -5.235), x_dir=(-1, 0, 0), z_dir=(0, -1, 0))) as fillet3_2_piece_2:
        with BuildLine():
            CenterArc((1.520122445, -0.6), FILLET3_R, 90, 124.703750134)
            ThreePointArc((1.026858378, -0.9416), (0.566139315, -0.413317168), (0, 0))
            Line((0, 0), (1.520122445, 0))
        make_face()
    extrude(amount=5.550306112, mode=Mode.SUBTRACT)
    with BuildSketch(Plane(origin=(63.7, 14.371320344, -4.1), x_dir=(-0.7071067811865439, 0, -0.7071067811865511), z_dir=(0, -1, 0))) as fillet3_2_piece_3:
        with BuildLine():
            CenterArc((FILLET3_R * 0.414213562373, FILLET3_R), FILLET3_R, 225, 45)
            Line((-FILLET3_R * 0.292893218813, FILLET3_R * 0.292893218813), (0, 0))
            Line((0, 0), (FILLET3_R * 0.414213562373, 0))
        make_face()
    extrude(amount=2.742640687, mode=Mode.SUBTRACT)


solid = part.part
